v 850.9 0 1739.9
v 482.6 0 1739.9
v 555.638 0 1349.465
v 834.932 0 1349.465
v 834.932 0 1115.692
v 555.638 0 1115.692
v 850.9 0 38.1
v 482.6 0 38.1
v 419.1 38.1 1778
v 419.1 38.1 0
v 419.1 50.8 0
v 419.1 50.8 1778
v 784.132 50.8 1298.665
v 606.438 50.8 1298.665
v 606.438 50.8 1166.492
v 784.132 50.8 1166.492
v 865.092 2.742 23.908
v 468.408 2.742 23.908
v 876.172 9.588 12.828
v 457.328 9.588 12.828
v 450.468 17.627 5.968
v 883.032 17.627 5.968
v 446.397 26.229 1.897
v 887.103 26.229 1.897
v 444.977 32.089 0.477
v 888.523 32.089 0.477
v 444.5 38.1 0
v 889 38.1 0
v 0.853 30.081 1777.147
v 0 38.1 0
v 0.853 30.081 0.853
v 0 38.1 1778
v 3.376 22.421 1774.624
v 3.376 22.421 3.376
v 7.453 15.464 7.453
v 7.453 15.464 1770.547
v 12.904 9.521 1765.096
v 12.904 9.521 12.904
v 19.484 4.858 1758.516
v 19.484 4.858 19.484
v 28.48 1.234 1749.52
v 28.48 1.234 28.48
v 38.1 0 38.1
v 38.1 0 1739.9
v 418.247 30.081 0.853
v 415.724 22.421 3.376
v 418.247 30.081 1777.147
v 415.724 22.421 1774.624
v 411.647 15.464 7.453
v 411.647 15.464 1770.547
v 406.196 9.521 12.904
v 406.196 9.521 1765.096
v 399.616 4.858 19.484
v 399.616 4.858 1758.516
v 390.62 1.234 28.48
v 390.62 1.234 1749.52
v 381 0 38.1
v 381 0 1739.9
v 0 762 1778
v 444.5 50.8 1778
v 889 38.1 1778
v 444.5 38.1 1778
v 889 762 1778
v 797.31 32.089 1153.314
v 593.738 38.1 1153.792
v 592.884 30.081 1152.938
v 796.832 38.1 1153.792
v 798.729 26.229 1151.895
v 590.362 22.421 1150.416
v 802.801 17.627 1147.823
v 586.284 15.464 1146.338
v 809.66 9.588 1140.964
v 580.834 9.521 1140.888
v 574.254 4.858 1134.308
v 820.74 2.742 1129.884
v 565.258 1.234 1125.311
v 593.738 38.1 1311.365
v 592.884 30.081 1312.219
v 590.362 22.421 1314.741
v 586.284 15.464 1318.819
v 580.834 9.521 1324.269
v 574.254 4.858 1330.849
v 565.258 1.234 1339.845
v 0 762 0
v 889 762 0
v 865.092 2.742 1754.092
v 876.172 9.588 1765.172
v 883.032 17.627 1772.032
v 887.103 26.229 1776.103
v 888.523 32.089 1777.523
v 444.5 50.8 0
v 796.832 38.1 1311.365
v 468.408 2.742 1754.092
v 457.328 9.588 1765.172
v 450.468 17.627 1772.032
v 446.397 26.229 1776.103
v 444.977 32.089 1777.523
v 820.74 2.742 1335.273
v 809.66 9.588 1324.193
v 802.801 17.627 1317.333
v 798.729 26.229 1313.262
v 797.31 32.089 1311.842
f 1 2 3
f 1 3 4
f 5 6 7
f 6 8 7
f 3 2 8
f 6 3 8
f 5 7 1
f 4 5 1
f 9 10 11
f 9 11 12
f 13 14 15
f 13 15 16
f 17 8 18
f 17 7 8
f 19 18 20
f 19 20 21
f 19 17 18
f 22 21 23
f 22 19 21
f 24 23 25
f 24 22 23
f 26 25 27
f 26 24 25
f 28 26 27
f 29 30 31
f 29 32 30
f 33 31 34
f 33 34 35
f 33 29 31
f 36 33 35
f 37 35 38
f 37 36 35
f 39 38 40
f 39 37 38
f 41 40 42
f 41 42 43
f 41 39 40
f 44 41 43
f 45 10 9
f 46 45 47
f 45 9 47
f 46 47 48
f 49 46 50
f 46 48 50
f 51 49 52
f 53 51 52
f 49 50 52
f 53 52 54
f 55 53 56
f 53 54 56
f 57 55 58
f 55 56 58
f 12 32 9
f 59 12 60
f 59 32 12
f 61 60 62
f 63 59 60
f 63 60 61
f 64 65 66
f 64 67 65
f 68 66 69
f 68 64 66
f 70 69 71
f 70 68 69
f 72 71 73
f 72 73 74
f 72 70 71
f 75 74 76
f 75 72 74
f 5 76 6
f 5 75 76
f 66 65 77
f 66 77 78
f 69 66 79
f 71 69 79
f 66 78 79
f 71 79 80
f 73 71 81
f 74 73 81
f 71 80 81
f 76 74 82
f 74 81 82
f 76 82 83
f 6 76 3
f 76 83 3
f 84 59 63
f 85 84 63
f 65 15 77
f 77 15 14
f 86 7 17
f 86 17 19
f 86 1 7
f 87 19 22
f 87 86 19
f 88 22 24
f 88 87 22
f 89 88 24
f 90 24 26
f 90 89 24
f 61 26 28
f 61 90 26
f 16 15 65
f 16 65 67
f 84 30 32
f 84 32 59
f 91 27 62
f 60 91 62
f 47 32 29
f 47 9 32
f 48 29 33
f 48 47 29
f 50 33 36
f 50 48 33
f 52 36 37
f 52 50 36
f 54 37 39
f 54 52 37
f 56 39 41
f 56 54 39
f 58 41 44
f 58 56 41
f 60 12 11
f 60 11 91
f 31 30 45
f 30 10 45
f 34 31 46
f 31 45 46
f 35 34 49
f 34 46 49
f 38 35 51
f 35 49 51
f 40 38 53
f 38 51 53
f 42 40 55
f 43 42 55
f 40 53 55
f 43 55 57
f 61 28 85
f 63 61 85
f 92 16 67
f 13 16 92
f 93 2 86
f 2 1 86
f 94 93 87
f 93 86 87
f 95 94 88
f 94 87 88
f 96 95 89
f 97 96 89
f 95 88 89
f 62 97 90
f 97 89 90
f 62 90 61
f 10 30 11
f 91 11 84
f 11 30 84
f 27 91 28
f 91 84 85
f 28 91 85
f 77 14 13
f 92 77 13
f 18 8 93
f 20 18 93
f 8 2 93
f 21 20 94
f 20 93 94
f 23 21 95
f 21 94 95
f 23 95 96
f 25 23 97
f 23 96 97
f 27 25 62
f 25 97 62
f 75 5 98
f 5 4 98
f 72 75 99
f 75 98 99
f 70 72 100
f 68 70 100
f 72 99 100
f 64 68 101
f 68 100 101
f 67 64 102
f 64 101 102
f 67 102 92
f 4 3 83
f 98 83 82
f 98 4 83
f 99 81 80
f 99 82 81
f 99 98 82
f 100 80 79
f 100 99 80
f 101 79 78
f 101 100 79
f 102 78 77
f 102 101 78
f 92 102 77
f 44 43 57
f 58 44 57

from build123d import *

# Parameters (mm, degrees)
F0_W     = 889
F0_H     = 762
F1_DEPTH = 1778
F2_W     = 25.4
F2_H     = 1778
F3_DEPTH = 50.8
F4_W     = 203.0948400497
F4_H     = 157.5736999512
F5_DEPTH = 50.8
F6_SIZE  = 12.7
F7_R     = 38.09999


# Not quite as in the source:
# - a fillet or chamfer is up to 0.001 mm smaller than in the source, because OpenCascade refuses the exact size


with BuildPart() as f1:
    # F0 (on Top) → F1 (new body)
    with BuildSketch(Plane.XY):
        with Locations((444.5, 381)):
            Rectangle(F0_W, F0_H)
    extrude(amount=F1_DEPTH)

    # F2 (on face) → F3 (cut)
    with BuildSketch(Plane.XZ):
        with Locations((431.8, 889)):
            Rectangle(F2_W, F2_H)
    extrude(amount=-F3_DEPTH, mode=Mode.SUBTRACT)

    # F4 (on face) → F5 (cut)
    with BuildSketch(Plane.XZ):
        with Locations((695.2850222588, 1232.5783967972)):
            Rectangle(F4_W, F4_H)
    extrude(amount=-F5_DEPTH, mode=Mode.SUBTRACT)

    # F6
    f6_edges = [f1.edges().sort_by_distance(p)[0] for p in [
        (695.285022, 50.8, 1311.365247),
        (593.737602, 50.8, 1232.578397),
        (695.285022, 50.8, 1153.791547),
        (796.832442, 50.8, 1232.578397),
    ]]
    chamfer(f6_edges, length=F6_SIZE)

    # F7 (radius 38.1 in the source; OpenCascade refuses exactly that, so slightly less here)
    f7_edges = [f1.edges().sort_by_distance(p)[0] for p in [
        (209.55, 0, 0),
        (419.1, 0, 889),
        (209.55, 0, 1778),
        (0, 0, 889),
        (666.75, 0, 0),
        (444.5, 0, 889),
        (889, 0, 889),
        (666.75, 0, 1778),
        (796.832442, 0, 1232.578397),
        (695.285022, 0, 1153.791547),
        (593.737602, 0, 1232.578397),
        (695.285022, 0, 1311.365247),
    ]]
    fillet(f7_edges, radius=F7_R)


solid = f1.part
